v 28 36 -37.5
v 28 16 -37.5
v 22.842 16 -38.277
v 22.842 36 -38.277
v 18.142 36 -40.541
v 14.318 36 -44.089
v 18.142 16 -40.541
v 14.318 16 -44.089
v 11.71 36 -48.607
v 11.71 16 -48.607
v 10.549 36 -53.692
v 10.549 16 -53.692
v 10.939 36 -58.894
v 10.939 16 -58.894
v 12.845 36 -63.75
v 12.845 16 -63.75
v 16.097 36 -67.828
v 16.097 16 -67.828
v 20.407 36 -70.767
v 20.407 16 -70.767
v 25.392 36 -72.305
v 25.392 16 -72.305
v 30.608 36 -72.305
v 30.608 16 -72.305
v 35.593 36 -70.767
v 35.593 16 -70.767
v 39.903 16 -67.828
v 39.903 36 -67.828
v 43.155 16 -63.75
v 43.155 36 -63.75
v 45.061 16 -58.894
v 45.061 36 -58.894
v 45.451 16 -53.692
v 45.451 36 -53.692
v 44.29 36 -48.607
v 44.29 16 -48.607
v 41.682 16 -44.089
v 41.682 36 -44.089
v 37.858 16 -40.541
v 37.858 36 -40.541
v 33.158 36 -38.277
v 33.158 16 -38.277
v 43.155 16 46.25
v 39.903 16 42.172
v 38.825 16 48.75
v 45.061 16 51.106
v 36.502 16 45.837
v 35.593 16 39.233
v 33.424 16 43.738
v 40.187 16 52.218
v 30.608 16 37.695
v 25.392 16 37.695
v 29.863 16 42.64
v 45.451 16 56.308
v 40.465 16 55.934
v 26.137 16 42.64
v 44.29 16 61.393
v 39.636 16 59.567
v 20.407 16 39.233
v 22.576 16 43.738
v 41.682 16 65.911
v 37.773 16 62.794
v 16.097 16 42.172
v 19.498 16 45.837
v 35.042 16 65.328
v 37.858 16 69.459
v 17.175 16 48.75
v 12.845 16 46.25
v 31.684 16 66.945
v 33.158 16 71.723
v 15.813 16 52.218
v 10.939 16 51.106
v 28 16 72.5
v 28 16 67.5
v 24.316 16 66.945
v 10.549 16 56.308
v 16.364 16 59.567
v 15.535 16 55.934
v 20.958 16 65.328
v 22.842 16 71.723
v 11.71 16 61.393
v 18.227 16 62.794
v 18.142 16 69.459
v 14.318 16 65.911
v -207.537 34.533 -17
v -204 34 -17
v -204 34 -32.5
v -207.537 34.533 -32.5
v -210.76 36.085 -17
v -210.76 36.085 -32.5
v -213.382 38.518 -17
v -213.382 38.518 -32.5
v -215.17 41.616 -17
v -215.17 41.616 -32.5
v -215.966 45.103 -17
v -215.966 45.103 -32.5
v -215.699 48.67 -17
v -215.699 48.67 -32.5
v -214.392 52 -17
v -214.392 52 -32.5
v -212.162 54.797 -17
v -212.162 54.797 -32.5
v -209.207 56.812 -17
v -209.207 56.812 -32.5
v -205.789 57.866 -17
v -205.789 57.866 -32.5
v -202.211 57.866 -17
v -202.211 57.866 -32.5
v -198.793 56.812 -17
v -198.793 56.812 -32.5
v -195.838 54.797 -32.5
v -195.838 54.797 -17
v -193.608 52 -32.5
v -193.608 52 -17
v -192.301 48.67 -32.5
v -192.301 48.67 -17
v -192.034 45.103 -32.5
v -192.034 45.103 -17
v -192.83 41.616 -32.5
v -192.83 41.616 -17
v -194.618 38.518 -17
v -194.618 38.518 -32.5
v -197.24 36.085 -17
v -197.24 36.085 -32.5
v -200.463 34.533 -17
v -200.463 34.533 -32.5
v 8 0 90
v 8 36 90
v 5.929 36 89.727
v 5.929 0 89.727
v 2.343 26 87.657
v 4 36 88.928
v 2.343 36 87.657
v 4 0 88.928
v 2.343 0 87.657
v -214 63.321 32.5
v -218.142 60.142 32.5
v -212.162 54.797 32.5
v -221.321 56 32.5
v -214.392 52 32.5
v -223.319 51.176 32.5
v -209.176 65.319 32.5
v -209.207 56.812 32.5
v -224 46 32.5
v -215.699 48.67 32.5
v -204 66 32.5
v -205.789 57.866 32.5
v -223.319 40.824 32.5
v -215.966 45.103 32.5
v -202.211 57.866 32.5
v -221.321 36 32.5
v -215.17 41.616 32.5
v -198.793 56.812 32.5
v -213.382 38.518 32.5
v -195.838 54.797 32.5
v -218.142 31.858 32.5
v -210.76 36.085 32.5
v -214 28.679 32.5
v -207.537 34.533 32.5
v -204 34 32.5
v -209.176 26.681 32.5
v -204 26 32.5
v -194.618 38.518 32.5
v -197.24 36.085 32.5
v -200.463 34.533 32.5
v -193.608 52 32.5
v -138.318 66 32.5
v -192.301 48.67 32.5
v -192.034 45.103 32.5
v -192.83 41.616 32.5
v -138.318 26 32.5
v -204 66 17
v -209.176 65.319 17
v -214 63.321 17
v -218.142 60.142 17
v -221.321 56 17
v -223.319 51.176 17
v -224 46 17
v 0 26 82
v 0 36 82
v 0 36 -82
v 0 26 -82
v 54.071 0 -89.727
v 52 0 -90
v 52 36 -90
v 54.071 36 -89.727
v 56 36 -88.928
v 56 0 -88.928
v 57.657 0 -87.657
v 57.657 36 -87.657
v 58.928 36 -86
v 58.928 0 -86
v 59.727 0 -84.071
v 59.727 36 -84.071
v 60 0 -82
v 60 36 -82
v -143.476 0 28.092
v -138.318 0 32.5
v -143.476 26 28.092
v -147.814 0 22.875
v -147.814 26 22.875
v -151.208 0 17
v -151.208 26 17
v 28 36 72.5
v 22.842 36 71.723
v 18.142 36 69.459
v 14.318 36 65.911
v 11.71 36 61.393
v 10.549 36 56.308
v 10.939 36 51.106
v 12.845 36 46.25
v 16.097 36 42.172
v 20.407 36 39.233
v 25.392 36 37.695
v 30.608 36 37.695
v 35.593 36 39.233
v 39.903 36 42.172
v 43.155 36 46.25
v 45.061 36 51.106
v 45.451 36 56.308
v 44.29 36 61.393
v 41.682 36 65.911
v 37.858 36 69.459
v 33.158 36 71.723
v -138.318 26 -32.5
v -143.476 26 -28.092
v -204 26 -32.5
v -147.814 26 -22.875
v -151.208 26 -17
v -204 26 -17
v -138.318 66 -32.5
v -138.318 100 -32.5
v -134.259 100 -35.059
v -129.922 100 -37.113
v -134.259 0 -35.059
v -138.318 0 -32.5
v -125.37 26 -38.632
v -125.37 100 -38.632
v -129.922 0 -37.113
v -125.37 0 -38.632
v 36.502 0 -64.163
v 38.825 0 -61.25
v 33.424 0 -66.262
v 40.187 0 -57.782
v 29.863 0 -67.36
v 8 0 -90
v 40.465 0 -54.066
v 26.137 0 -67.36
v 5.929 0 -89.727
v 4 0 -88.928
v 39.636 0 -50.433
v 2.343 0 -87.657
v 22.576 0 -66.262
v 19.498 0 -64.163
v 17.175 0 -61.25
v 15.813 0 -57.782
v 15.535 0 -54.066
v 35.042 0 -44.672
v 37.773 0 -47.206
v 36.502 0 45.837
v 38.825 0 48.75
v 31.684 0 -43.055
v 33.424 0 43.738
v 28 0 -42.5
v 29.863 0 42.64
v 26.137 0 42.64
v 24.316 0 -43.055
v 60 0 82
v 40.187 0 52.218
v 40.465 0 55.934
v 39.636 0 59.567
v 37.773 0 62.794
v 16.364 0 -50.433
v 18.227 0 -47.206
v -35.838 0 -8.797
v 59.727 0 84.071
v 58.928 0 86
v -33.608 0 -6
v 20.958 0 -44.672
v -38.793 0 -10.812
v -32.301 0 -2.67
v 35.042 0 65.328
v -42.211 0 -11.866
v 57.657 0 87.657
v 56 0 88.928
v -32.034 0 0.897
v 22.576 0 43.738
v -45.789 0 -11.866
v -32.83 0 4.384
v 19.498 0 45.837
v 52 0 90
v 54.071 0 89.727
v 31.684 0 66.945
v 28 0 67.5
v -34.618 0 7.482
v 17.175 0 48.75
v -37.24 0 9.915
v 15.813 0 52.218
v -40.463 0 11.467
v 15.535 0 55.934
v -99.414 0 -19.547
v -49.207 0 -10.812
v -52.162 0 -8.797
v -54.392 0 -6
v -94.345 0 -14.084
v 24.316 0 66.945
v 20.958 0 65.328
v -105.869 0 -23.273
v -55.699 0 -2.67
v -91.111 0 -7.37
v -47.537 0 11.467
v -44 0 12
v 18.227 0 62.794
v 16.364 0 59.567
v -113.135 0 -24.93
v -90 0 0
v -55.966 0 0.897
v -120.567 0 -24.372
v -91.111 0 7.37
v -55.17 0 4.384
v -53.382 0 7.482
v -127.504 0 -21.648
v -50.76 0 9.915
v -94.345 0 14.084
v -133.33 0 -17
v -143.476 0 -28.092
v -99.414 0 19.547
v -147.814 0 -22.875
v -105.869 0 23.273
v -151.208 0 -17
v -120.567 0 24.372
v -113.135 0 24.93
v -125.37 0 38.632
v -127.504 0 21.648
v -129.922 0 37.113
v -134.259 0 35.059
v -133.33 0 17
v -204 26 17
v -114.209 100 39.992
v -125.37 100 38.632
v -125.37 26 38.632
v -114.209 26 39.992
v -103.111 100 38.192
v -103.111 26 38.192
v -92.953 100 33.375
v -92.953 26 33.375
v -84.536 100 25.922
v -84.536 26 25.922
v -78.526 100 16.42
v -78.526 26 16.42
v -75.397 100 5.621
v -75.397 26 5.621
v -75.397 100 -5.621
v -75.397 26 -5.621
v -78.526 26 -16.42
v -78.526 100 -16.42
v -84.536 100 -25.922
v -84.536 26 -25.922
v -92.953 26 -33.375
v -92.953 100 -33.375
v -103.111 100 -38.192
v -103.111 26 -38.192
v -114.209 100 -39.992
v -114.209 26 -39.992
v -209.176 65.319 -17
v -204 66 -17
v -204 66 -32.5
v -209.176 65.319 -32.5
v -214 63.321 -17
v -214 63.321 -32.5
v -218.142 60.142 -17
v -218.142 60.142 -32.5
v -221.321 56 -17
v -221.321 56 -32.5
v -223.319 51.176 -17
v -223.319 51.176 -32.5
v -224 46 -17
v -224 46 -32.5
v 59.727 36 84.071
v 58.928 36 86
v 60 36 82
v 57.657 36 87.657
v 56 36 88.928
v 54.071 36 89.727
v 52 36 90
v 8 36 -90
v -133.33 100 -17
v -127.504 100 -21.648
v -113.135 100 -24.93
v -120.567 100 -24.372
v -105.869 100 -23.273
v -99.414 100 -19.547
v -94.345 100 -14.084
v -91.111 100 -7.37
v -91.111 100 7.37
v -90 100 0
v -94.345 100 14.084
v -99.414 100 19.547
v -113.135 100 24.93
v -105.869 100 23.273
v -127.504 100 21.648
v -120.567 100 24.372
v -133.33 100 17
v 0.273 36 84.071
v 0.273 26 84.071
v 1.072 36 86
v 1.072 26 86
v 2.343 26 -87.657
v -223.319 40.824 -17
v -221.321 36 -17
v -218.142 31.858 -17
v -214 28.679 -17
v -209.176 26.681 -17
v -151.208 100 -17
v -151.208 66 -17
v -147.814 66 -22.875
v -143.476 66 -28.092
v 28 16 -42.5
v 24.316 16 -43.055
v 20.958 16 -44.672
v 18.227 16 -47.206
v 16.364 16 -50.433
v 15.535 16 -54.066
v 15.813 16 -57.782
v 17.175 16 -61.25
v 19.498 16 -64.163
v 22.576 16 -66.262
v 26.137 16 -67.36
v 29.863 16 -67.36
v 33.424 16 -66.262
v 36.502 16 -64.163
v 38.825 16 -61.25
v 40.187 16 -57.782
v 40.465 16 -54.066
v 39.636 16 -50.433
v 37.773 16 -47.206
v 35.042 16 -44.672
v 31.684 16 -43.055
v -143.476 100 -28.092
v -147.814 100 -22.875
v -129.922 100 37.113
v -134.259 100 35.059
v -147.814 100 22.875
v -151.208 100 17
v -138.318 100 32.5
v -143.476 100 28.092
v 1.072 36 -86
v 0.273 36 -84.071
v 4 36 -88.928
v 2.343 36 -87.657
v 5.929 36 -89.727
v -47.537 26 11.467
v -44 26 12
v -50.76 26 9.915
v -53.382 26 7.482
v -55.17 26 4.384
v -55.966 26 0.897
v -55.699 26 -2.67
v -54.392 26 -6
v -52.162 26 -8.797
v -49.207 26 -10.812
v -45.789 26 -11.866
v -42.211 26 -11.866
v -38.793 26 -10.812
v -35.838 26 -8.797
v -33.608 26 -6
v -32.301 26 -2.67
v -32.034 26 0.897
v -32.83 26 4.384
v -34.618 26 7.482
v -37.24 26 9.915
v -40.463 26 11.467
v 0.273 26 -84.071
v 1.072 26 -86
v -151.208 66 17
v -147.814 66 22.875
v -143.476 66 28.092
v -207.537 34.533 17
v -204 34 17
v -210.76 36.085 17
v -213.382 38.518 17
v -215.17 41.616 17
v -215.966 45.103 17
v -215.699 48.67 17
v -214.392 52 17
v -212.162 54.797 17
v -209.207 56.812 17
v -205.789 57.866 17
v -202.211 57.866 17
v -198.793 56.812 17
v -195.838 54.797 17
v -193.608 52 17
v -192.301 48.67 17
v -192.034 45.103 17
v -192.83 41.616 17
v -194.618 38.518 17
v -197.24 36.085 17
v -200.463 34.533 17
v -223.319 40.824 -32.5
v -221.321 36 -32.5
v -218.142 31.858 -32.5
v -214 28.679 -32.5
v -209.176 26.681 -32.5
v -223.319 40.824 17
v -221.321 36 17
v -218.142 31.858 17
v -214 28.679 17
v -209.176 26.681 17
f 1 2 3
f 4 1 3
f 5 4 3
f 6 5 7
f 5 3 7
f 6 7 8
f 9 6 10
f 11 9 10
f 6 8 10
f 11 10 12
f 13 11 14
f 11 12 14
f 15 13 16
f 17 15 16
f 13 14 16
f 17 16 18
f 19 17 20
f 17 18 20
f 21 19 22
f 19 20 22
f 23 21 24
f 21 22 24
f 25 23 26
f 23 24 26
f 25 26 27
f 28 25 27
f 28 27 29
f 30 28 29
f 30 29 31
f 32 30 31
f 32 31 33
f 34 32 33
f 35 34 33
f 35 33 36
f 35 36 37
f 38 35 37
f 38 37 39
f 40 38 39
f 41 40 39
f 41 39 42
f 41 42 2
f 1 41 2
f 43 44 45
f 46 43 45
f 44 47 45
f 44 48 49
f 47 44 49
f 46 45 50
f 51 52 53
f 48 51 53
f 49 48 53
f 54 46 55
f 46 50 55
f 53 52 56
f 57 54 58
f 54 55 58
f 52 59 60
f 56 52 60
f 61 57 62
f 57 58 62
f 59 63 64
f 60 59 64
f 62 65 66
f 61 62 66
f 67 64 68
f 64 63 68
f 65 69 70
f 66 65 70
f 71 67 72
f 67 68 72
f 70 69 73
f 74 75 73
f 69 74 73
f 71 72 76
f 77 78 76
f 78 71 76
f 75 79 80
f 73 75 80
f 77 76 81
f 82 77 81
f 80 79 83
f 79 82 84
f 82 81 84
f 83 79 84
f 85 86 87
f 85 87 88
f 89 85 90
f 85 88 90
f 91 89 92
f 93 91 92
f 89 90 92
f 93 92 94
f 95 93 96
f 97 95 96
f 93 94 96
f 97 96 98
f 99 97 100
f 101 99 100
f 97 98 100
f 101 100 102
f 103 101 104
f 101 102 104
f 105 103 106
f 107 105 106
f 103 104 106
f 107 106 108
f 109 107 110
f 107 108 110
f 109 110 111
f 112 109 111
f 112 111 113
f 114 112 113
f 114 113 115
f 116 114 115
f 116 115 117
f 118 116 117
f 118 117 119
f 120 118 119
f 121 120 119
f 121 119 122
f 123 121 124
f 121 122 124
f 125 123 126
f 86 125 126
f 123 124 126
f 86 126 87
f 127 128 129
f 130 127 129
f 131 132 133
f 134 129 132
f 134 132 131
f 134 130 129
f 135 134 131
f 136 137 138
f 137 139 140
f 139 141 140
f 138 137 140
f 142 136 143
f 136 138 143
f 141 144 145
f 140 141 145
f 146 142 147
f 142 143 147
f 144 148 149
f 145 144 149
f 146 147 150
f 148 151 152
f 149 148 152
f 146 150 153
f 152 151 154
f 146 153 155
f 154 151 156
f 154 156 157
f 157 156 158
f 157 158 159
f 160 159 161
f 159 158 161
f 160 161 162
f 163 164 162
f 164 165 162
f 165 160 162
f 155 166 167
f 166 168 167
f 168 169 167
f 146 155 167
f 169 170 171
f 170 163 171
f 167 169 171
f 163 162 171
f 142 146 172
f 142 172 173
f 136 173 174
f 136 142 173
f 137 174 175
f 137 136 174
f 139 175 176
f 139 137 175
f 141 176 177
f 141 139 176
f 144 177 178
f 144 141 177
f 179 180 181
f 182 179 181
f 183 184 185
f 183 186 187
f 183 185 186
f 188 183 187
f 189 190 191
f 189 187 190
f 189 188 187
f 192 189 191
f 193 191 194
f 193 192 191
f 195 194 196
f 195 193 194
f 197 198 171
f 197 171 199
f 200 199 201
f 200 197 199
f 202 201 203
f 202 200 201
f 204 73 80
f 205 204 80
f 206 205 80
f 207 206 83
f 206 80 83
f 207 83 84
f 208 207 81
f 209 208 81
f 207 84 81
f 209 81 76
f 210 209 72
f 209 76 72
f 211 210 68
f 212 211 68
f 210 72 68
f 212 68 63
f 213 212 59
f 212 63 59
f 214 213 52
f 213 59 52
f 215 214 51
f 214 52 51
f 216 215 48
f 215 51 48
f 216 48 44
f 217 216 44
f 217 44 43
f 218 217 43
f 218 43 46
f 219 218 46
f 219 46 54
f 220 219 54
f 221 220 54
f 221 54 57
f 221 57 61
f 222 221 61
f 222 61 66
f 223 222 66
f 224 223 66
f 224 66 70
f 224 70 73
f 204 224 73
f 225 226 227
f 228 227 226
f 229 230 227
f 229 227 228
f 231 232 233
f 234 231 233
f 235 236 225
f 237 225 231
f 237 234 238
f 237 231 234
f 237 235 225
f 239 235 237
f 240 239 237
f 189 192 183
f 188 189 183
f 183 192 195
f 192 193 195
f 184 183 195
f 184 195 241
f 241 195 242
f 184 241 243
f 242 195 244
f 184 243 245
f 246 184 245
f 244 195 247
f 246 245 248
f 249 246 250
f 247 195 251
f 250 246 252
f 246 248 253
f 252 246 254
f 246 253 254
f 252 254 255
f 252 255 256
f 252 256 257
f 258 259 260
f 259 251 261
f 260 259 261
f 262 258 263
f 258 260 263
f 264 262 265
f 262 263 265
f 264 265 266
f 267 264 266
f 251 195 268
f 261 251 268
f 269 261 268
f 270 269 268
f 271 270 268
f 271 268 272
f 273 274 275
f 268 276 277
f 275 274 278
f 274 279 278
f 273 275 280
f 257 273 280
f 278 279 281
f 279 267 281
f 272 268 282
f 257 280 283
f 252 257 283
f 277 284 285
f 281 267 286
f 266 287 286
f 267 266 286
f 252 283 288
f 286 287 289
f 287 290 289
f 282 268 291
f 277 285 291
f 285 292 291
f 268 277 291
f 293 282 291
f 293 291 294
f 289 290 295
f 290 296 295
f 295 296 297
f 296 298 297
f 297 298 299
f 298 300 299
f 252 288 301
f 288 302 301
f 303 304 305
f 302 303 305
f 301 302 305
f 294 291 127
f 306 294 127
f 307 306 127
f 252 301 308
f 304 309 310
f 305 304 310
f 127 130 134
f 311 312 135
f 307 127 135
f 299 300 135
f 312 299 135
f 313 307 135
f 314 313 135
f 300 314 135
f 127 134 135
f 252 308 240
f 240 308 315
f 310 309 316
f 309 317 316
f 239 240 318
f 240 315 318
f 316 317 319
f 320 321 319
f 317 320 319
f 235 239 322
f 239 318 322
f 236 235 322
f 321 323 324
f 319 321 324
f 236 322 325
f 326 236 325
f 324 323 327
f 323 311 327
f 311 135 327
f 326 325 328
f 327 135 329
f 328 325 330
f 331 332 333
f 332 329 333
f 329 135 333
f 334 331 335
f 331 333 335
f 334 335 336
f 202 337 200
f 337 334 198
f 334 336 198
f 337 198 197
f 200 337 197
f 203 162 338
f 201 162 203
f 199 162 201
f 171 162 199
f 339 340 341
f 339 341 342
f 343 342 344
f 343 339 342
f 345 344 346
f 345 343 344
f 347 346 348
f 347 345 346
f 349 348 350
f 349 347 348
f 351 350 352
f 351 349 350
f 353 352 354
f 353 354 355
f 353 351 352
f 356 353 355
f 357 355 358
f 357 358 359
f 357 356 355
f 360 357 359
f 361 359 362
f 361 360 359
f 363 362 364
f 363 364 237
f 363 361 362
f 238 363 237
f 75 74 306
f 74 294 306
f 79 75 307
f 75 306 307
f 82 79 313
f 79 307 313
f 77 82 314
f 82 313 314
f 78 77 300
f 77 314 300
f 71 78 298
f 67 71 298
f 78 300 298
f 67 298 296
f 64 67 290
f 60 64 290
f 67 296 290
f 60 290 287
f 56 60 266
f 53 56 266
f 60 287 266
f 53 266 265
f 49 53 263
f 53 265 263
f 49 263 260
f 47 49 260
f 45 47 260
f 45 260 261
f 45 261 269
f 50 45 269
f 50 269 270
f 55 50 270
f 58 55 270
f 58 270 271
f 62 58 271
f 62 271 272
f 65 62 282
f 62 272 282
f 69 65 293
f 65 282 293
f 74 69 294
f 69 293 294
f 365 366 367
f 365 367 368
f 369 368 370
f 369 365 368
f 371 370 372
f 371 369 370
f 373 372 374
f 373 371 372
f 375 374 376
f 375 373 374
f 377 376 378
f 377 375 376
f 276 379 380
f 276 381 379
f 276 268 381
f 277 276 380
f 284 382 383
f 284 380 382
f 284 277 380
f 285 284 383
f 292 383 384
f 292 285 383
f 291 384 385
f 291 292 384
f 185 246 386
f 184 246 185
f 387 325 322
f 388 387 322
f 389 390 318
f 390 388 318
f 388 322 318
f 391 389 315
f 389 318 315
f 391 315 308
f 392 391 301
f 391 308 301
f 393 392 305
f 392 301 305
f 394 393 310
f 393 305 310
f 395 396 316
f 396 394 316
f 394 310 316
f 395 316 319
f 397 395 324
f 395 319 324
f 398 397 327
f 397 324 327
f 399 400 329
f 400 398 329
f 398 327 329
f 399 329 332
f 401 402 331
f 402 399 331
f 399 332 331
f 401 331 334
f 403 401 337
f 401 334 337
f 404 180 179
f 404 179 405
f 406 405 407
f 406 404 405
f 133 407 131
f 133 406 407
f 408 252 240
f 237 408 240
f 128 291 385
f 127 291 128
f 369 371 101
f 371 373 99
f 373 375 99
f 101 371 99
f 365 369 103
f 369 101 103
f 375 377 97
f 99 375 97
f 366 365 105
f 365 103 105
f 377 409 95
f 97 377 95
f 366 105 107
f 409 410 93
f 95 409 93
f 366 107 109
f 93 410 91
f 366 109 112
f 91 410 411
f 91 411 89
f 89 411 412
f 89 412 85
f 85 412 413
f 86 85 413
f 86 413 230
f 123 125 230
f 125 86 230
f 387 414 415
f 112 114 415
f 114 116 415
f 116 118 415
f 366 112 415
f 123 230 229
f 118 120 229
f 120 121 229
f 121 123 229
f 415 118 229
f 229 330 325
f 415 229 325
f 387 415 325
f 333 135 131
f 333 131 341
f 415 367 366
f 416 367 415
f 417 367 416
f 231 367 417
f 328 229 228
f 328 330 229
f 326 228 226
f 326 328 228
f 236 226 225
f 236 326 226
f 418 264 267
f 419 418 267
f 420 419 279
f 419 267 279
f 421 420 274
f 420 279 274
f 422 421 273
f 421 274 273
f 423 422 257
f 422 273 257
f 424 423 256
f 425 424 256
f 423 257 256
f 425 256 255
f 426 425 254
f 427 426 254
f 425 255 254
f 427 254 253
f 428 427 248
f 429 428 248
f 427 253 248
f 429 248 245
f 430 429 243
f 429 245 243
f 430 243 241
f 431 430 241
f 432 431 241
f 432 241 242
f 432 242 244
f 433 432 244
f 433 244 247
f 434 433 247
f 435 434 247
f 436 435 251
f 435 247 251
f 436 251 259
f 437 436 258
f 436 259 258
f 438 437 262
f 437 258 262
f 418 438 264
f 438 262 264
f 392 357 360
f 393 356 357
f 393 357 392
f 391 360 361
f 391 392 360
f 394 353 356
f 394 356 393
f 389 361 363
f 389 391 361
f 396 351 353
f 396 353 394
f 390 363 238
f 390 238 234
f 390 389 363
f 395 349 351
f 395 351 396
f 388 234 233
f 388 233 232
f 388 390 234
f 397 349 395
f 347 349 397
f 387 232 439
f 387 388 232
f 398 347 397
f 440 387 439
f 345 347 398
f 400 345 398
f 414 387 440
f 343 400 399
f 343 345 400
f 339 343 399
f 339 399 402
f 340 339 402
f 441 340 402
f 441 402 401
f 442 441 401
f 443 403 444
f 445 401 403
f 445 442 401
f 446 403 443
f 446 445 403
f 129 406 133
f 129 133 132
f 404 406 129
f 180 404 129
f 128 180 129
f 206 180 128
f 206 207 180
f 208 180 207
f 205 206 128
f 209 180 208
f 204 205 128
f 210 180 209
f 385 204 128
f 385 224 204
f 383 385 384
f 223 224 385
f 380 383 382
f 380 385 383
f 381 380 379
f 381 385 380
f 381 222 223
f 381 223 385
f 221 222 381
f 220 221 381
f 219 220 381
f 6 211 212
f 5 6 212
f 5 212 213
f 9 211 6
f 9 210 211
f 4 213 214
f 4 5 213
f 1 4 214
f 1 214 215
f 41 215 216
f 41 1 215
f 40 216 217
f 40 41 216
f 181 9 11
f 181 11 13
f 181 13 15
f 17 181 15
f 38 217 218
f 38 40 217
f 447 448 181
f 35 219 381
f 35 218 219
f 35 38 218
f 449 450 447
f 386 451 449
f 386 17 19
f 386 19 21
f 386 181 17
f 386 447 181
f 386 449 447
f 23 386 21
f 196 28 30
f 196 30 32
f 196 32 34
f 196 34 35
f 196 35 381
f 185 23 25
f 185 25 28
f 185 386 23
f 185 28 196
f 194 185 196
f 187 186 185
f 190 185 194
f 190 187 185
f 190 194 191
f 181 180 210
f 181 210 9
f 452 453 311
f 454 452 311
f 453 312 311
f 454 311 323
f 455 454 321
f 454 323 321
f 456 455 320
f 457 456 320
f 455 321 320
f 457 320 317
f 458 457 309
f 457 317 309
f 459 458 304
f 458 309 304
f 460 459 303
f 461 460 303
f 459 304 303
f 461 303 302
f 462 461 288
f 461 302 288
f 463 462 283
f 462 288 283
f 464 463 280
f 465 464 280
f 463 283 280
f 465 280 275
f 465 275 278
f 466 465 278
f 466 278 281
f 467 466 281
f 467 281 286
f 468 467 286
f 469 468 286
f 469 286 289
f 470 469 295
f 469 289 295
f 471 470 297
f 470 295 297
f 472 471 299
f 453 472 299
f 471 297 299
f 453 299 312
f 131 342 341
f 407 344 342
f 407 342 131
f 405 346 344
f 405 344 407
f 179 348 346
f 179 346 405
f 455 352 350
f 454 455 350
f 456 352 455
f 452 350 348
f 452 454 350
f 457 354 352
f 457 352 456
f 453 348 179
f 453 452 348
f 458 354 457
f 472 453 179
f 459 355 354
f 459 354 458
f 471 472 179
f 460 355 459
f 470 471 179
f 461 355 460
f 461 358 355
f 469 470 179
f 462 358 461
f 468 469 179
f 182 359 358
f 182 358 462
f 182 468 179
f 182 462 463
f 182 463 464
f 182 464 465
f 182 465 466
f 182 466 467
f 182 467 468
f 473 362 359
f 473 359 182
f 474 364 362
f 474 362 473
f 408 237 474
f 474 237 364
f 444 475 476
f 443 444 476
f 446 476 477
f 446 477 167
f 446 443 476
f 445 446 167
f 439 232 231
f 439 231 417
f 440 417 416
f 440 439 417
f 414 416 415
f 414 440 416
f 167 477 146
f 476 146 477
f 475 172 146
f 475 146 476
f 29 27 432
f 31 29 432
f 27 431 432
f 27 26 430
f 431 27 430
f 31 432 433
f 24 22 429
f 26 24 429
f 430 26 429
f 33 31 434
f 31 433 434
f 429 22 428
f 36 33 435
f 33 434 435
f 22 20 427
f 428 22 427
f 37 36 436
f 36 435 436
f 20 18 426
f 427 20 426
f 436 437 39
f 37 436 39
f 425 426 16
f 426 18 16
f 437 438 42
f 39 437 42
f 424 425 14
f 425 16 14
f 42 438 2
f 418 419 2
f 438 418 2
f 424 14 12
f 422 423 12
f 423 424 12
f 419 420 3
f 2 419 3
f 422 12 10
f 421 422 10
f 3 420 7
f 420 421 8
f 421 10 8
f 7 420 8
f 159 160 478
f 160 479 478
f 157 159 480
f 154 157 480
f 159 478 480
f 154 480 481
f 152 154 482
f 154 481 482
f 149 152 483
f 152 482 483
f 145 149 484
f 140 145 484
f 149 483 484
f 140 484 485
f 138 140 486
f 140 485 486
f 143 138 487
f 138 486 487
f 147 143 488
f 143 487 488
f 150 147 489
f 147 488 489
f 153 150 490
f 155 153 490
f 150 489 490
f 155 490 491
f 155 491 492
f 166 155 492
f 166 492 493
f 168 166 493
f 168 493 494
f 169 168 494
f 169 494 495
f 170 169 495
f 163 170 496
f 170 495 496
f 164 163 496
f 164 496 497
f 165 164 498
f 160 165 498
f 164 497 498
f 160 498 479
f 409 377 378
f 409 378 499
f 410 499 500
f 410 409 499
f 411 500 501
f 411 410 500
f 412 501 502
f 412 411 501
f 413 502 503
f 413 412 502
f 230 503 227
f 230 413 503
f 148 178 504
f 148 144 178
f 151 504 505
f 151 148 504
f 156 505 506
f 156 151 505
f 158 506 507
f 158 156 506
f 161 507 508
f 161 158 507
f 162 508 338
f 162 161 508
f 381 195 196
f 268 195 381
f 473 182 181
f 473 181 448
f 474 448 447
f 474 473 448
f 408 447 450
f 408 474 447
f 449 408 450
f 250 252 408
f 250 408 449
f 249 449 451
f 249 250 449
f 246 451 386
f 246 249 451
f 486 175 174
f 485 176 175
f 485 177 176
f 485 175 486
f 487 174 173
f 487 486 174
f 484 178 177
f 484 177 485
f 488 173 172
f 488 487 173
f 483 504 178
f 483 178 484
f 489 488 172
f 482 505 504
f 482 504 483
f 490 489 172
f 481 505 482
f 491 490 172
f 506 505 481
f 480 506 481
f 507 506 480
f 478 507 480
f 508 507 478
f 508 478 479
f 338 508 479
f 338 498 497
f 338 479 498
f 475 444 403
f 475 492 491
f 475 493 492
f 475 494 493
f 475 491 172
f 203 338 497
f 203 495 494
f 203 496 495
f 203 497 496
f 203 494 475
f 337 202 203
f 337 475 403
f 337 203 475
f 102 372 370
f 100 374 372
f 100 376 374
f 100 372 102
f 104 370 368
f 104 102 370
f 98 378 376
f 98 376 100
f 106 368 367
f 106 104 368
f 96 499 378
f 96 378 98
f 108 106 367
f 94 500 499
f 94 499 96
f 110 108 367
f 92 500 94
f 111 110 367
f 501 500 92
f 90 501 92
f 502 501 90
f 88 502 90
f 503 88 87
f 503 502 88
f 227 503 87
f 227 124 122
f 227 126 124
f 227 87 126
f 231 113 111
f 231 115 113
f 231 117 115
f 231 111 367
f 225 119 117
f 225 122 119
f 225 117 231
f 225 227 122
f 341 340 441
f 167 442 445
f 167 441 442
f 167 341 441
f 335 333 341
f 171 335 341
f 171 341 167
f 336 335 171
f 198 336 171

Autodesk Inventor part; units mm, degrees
ref_plane "YZ Plane" through (0, 0, 0) normal (1, 0, 0) x (0, 1, 0)
ref_plane "XZ Plane" through (0, 0, 0) normal (0, 1, 0) x (-1, 0, 0)
ref_plane "XY Plane" through (0, 0, 0) normal (0, 0, 1) x (1, 0, 0)
sketch "Szkic1" plane through (0, 0, 0) normal (0, 1, 0) x (-1, 0, 0)
  line L0 (-8, -90) -> (-52, -90)
  line L1 (-60, -82) -> (-60, 82)
  line L2 (-52, 90) -> (-8, 90)
  line L3 (0, 82) -> (0, -82)
  arc A0 (-8, -90) -> (0, -82) centre (-8, -82) ccw
  arc A1 (-60, -82) -> (-52, -90) centre (-52, -82) ccw
  arc A2 (0, 82) -> (-8, 90) centre (-8, 82) ccw
  arc A3 (-52, 90) -> (-60, 82) centre (-52, 82) ccw
  line L4 (-2.3431, -87.6569) -> (125.3697, -38.6325)
  line L5 (-2.3431, -87.6569) -> (134.4558, -87.6569) construction
  line L6 (-2.3431, 87.6569) -> (125.3697, 38.6325)
  line L7 (-2.3431, 87.6569) -> (134.4558, 87.6569) construction
  line L8 (193.533, -17) -> (224, -17)
  line L9 (224, 17) -> (193.533, 17)
  line L10 (193.533, -17) -> (133.3303, -17)
  line L11 (193.533, 17) -> (133.3303, 17)
  line L12 (224, -17) -> (224, -32.5)
  line L13 (224, 17) -> (224, 32.5)
  line L14 (224, 32.5) -> (138.3184, 32.5)
  line L15 (224, -32.5) -> (138.3184, -32.5)
  arc A4 (133.3303, 17) -> (133.3303, -17) centre (115, 0) ccw
  arc A5 (151.2077, 17) -> (151.2077, -17) centre (115, 0) ccw
  point P0 (0, 0)
  point P1 (-60, 90)
  point P2 (-60, -90)
  point P3 (0, 90)
  point P4 (-30, 0)
  point P5 (125.3697, 38.6325)
  dimension "d0" = 60
  dimension "d1" = 180
  dimension "d2" = 8
  dimension "d5" = 21
  dimension "d6" = 21
  dimension "d9" = 15.5
  dimension "d10" = 15.5
extrude "Wyciągnięcie proste1" add sketch "Szkic1" along normal blind 100
sketch "Szkic2" plane through (0, 100, 0) normal (0, 1, 0) x (1, 0, 0)
  line L0 (8, -90) -> (52, -90)
  line L1 (60, -82) -> (60, 82)
  line L2 (52, 90) -> (8, 90)
  line L3 (0, 82) -> (0, -82)
  arc A0 (0, -82) -> (8, -90) centre (8, -82) ccw
  arc A1 (8, 90) -> (0, 82) centre (8, 82) ccw
  arc A2 (60, 82) -> (52, 90) centre (52, 82) ccw
  arc A3 (52, -90) -> (60, -82) centre (52, -82) ccw
  point P0 (0, 0)
  dimension "d13" = 8
extrude "Wyciągnięcie proste2" cut sketch "Szkic2" against normal blind 64
sketch "Szkic3" plane through (0, 100, 0) normal (0, 1, 0) x (1, 0, 0)
  arc A0 (-138.3184, -32.5) -> (-125.3697, -38.6325) centre (-115, 0) ccw projected
  arc A1 (-125.3697, 38.6325) -> (-138.3184, 32.5) centre (-115, 0) ccw projected
  arc A2 (-138.3184, -32.5) -> (-138.3184, 32.5) centre (-115, 0) ccw
  line L0 (-125.3697, -38.6325) -> (2.3431, -87.6569) projected
  line L1 (-125.3697, -38.6325) -> (2.3431, -87.6569)
  line L2 (2.3431, 87.6569) -> (-125.3697, 38.6325) projected
  line L3 (-125.3697, 38.6325) -> (2.3431, 87.6569)
  line L4 (0, -82) -> (0, 82) projected
  line L5 (0, -82) -> (0, 82)
  arc A3 (0, -82) -> (2.3431, -87.6569) centre (8, -82) ccw projected
  arc A4 (0, -82) -> (2.3431, -87.6569) centre (8, -82) ccw
  arc A5 (8, 90) -> (2.3431, 87.6569) centre (8, 82) ccw projected
  arc A6 (8, 90) -> (0, 82) centre (8, 82) ccw
  point P0 (0, 0)
  point P1 (-125.3697, 38.6325)
  point P2 (-125.3697, -38.6325)
extrude "Wyciągnięcie proste3" cut sketch "Szkic3" against normal blind 74
sketch "Szkic4" plane through (0, 0, 0) normal (0, -1, 0) x (1, 0, 0)
  line L0 (-224, 32.5) -> (-138.3184, 32.5) projected
  line L1 (-224, 32.5) -> (-138.3184, 32.5)
  line L2 (-224, 17) -> (-224, 32.5) projected
  line L3 (-224, 32.5) -> (-224, 17)
  arc A0 (-125.3697, 38.6325) -> (-138.3184, 32.5) centre (-115, 0) ccw projected
  arc A1 (-138.3184, 32.5) -> (-151.2077, 17) centre (-115, 0) ccw
  line L4 (-133.3303, 17) -> (-224, 17) projected
  line L5 (-224, 17) -> (-151.2077, 17)
  arc A2 (-138.3184, -32.5) -> (-125.3697, -38.6325) centre (-115, 0) ccw projected
  arc A3 (-151.2077, -17) -> (-137.5648, -33.0277) centre (-115, 0) ccw
  line L6 (-224, -17) -> (-133.3303, -17) projected
  line L7 (-151.2077, -17) -> (-224, -17)
  line L8 (-224, -32.5) -> (-224, -17) projected
  line L9 (-224, -17) -> (-224, -32.5)
  line L10 (-224, -32.5) -> (-138.3184, -32.5)
  point P0 (0, 0)
  point P1 (-138.3184, -32.5)
  dimension "d18" = 40
extrude "Wyciągnięcie proste4" cut sketch "Szkic4" against normal blind 26
sketch "Szkic5" plane through (0, 100, 0) normal (0, 1, 0) x (1, 0, 0)
  arc A0 (-138.3184, 32.5) -> (-151.2077, 17) centre (-115, 0) ccw projected
  arc A1 (-138.3184, 32.5) -> (-151.2077, 17) centre (-115, 0) ccw
  arc A2 (-151.2077, -17) -> (-125.3697, -38.6325) centre (-115, 0) ccw projected
  line L0 (-224, -32.5) -> (-138.3184, -32.5) projected
  arc A3 (-151.2077, -17) -> (-138.3184, -32.5) centre (-115, 0) ccw
  line L1 (-138.3184, 32.5) -> (-224, 32.5) projected
  line L2 (-138.3184, 32.5) -> (-224, 32.5)
  line L3 (-224, 32.5) -> (-224, 17) projected
  line L4 (-224, 32.5) -> (-224, 17)
  line L5 (-224, 17) -> (-151.2077, 17)
  line L6 (-133.3303, -17) -> (-224, -17) projected
  line L7 (-151.2077, -17) -> (-224, -17)
  line L8 (-224, -17) -> (-224, -32.5) projected
  line L9 (-224, -17) -> (-224, -32.5)
  line L10 (-224, -32.5) -> (-138.3184, -32.5)
  point P0 (0, 0)
extrude "Wyciągnięcie proste5" cut sketch "Szkic5" against normal blind 34
sketch "Szkic6" plane through (-224, 26, 32.5) normal (0, 0, 1) x (1, 0, 0)
  point P0 (224, -26)
sketch "Szkic7" plane through (0, 36, 0) normal (0, 1, 0) x (1, 0, 0)
  line L0 (8, 90) -> (52, 90) projected
  line L1 (60, 82) -> (60, -82) projected
  point P0 (0, 0)
  point P1 (28, 55)
  point P2 (30, 90)
  point P3 (28, -55)
  dimension "d23" = 35
  dimension "d24" = 32
sketch "Szkic8" plane through (0, 26, 0) normal (0, 1, 0) x (1, 0, 0)
  point P0 (0, 0)
  point P1 (44, 0)
  point P2 (44, 0)
  point P3 (-44, 0)
hole "Otwór1" at (-44, 26, 0) direction (0, -1, 0) diameter 24 end through all
hole "Otwór2" at (28, 36, -55) at (28, 36, 55) direction (0, -1, 0) diameter 25 end through all counterbore diameter 35 counterbore depth 20
sketch "Szkic9" plane through (-224, 26, 32.5) normal (0, 0, 1) x (1, 0, 0)
  point P0 (224, -26)
sketch "Szkic10" plane through (-224, 26, 32.5) normal (0, 0, 1) x (1, 0, 0)
  point P0 (224, -26)
  point P1 (20, 20)
hole "Otwór3" at (-204, 46, 32.5) direction (0, 0, -1) diameter 24 end through all
full round fillet "Zaokrąglenie pełne1" first side at (-199.7359, 66, -22.1667) centre faces at (-224, 39.3333, -27.3333) second side at (-199.7359, 26, -22.1667)
full round fillet "Zaokrąglenie pełne2" first side at (-199.7359, 66, 22.1667) centre faces at (-224, 39.3333, 22.1667) second side at (-199.7359, 26, 22.1667)
